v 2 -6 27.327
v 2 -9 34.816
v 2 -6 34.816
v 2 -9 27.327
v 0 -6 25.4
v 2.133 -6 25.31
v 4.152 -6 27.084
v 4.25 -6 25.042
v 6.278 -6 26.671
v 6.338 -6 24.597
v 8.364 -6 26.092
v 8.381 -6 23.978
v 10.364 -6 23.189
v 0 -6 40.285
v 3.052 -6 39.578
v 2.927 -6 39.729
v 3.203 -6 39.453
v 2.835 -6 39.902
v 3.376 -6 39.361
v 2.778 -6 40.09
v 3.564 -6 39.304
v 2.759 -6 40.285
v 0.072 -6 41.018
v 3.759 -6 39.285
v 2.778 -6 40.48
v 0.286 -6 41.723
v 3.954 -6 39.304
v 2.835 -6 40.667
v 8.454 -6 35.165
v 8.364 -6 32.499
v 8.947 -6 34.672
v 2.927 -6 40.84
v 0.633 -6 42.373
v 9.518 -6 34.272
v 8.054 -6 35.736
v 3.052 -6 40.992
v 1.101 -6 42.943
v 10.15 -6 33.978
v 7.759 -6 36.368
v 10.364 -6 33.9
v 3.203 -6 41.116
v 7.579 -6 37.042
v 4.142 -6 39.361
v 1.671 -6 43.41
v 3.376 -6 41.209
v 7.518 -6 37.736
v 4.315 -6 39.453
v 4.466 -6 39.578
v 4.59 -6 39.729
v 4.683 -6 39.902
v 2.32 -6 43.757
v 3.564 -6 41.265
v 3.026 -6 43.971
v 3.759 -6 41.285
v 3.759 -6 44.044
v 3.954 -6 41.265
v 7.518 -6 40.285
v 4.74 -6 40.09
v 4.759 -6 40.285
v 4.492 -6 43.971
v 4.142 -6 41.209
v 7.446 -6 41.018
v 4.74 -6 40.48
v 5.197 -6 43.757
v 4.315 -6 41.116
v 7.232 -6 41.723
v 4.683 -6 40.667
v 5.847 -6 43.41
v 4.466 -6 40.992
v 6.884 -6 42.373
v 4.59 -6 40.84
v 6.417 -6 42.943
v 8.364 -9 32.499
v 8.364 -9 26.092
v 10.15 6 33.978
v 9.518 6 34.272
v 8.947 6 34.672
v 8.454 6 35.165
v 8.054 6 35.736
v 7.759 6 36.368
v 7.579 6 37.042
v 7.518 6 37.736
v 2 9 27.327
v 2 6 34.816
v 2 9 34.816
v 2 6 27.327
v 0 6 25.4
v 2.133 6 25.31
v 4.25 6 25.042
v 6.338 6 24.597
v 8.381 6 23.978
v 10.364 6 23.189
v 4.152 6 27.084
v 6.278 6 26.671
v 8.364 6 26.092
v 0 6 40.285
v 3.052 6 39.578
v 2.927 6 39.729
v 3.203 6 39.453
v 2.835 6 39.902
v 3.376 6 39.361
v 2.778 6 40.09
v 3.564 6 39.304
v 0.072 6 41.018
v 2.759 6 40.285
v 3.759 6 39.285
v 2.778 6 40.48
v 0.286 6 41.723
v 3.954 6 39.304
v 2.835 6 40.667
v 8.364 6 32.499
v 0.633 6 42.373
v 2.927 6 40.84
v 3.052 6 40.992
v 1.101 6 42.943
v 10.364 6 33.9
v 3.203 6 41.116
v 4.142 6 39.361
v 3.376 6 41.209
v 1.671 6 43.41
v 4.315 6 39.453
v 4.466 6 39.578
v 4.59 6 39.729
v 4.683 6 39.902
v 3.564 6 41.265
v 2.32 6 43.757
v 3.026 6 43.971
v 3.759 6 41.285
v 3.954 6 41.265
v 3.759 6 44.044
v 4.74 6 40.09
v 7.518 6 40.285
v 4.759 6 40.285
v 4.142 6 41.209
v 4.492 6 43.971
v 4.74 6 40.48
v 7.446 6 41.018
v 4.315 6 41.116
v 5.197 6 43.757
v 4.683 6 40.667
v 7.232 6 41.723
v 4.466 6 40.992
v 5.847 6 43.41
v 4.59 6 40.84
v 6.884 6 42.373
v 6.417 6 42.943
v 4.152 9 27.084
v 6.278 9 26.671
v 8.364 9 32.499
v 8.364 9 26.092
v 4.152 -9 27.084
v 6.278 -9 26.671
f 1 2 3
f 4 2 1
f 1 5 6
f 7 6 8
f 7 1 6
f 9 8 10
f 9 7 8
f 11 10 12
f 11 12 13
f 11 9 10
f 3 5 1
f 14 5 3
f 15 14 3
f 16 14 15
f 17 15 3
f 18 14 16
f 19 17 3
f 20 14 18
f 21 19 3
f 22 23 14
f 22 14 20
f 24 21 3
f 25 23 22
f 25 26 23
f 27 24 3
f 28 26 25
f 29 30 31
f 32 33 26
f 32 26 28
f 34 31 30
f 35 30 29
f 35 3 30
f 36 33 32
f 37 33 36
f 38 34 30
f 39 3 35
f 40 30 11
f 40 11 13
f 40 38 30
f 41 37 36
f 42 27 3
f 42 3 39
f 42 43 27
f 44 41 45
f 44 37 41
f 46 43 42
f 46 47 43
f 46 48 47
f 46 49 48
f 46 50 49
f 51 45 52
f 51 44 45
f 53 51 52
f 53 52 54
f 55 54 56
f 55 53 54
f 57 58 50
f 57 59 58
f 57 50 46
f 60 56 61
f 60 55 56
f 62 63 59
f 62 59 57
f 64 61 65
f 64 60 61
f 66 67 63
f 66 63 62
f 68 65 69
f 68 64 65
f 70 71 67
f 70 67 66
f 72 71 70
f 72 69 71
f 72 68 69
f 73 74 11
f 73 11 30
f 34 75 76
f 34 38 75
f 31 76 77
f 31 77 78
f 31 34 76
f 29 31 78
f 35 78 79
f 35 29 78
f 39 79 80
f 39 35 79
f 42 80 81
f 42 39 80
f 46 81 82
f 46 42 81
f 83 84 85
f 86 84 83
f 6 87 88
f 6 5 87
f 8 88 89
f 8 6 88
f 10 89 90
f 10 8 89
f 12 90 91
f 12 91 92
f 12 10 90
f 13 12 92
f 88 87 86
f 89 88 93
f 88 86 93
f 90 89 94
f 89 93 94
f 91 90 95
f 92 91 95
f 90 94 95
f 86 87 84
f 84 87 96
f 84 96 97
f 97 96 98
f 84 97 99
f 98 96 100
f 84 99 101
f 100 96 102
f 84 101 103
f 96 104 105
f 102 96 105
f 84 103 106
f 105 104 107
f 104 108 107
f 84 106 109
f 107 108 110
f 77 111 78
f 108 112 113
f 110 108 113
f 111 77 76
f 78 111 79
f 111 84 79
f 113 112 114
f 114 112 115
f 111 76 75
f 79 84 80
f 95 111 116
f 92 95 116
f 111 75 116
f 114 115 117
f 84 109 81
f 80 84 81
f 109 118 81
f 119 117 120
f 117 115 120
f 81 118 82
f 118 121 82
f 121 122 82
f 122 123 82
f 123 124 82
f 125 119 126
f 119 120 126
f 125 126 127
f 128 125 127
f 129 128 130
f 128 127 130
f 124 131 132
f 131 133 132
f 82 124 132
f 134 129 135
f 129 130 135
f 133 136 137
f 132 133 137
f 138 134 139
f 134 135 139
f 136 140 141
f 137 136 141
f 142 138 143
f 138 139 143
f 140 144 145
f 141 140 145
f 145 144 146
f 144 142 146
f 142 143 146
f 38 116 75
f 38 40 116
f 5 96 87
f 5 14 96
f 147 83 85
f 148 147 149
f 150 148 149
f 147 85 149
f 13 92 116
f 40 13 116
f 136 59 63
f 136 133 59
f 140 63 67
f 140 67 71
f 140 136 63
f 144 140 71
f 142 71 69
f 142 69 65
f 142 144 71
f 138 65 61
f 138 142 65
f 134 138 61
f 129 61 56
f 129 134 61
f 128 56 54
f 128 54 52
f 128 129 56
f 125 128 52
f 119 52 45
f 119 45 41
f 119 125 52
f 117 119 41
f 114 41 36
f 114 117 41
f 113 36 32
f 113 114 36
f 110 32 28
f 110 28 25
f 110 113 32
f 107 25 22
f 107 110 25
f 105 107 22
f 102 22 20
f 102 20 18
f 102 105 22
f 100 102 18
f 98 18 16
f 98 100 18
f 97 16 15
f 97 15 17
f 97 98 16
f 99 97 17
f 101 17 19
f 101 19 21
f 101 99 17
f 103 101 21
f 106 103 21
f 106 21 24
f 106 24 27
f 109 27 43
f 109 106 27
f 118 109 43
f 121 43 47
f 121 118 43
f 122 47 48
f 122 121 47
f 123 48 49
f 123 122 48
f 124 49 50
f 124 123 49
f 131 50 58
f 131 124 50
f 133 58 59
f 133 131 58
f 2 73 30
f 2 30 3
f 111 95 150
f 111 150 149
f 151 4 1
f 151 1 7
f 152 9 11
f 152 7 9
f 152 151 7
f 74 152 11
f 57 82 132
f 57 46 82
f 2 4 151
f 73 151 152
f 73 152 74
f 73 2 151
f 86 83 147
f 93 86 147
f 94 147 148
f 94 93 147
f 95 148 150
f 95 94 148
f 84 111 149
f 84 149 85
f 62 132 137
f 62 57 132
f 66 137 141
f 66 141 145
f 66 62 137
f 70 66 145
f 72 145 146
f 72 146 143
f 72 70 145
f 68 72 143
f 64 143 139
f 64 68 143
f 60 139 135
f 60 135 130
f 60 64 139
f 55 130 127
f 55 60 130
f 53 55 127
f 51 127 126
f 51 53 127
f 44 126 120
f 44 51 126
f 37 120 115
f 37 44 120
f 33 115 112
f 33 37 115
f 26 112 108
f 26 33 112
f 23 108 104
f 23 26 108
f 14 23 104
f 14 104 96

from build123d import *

# Parameters (mm, degrees)
F0_R     = 1
F1_DEPTH = 6
F2_DEPTH = 9
F3_R     = 4


with BuildPart() as f1:
    # F0 (on Front) → F1 (new body, symmetric)
    with BuildSketch(Plane.XZ):
        with BuildLine():
            Line((0, 37.671893), (0, 25.4))
            ThreePointArc((0, 25.4), (5.298719, 24.841167), (10.364281, 23.189258))
            Line((10.364281, 23.189258), (10.364281, 25.364181))
            Line((10.364281, 25.364181), (10.364281, 33.899603))
            Line((10.364281, 33.899603), (7.517861, 34.935616))
            Line((7.517861, 34.935616), (0, 37.671893))
        make_face()
        with BuildLine():
            Line((2, 27.32691), (2, 34.815597))
            Line((2, 34.815597), (8.364471, 32.499119))
            Line((8.364471, 32.499119), (8.364471, 26.092061))
            ThreePointArc((8.364471, 26.092061), (5.218886, 26.898387), (2, 27.32691))
        make_face(mode=Mode.SUBTRACT)
        with BuildLine():
            Line((0, 40.284664), (0, 37.671893))
            Line((0, 37.671893), (7.517861, 34.935616))
            Line((7.517861, 34.935616), (7.517861, 40.284664))
            ThreePointArc((7.517861, 40.284664), (3.75893, 44.043594), (0, 40.284664))
        make_face()
        with Locations((3.75893, 40.284664)):
            Circle(F0_R, mode=Mode.SUBTRACT)
    extrude(amount=F1_DEPTH, both=True)

    # F0 (on Front) → F2 (join, symmetric)
    with BuildSketch(Plane.XZ):
        with BuildLine():
            Line((8.364471, 32.499119), (2, 34.815597))
            Line((2, 34.815597), (2, 27.32691))
            ThreePointArc((2, 27.32691), (5.218886, 26.898387), (8.364471, 26.092061))
            Line((8.364471, 26.092061), (8.364471, 32.499119))
        make_face()
    extrude(amount=F2_DEPTH, both=True)

    # F3
    f3_edges = [f1.edges().sort_by_distance(p)[0] for p in [
        (7.517861, 0, 34.935616),
    ]]
    fillet(f3_edges, radius=F3_R)


solid = f1.part
